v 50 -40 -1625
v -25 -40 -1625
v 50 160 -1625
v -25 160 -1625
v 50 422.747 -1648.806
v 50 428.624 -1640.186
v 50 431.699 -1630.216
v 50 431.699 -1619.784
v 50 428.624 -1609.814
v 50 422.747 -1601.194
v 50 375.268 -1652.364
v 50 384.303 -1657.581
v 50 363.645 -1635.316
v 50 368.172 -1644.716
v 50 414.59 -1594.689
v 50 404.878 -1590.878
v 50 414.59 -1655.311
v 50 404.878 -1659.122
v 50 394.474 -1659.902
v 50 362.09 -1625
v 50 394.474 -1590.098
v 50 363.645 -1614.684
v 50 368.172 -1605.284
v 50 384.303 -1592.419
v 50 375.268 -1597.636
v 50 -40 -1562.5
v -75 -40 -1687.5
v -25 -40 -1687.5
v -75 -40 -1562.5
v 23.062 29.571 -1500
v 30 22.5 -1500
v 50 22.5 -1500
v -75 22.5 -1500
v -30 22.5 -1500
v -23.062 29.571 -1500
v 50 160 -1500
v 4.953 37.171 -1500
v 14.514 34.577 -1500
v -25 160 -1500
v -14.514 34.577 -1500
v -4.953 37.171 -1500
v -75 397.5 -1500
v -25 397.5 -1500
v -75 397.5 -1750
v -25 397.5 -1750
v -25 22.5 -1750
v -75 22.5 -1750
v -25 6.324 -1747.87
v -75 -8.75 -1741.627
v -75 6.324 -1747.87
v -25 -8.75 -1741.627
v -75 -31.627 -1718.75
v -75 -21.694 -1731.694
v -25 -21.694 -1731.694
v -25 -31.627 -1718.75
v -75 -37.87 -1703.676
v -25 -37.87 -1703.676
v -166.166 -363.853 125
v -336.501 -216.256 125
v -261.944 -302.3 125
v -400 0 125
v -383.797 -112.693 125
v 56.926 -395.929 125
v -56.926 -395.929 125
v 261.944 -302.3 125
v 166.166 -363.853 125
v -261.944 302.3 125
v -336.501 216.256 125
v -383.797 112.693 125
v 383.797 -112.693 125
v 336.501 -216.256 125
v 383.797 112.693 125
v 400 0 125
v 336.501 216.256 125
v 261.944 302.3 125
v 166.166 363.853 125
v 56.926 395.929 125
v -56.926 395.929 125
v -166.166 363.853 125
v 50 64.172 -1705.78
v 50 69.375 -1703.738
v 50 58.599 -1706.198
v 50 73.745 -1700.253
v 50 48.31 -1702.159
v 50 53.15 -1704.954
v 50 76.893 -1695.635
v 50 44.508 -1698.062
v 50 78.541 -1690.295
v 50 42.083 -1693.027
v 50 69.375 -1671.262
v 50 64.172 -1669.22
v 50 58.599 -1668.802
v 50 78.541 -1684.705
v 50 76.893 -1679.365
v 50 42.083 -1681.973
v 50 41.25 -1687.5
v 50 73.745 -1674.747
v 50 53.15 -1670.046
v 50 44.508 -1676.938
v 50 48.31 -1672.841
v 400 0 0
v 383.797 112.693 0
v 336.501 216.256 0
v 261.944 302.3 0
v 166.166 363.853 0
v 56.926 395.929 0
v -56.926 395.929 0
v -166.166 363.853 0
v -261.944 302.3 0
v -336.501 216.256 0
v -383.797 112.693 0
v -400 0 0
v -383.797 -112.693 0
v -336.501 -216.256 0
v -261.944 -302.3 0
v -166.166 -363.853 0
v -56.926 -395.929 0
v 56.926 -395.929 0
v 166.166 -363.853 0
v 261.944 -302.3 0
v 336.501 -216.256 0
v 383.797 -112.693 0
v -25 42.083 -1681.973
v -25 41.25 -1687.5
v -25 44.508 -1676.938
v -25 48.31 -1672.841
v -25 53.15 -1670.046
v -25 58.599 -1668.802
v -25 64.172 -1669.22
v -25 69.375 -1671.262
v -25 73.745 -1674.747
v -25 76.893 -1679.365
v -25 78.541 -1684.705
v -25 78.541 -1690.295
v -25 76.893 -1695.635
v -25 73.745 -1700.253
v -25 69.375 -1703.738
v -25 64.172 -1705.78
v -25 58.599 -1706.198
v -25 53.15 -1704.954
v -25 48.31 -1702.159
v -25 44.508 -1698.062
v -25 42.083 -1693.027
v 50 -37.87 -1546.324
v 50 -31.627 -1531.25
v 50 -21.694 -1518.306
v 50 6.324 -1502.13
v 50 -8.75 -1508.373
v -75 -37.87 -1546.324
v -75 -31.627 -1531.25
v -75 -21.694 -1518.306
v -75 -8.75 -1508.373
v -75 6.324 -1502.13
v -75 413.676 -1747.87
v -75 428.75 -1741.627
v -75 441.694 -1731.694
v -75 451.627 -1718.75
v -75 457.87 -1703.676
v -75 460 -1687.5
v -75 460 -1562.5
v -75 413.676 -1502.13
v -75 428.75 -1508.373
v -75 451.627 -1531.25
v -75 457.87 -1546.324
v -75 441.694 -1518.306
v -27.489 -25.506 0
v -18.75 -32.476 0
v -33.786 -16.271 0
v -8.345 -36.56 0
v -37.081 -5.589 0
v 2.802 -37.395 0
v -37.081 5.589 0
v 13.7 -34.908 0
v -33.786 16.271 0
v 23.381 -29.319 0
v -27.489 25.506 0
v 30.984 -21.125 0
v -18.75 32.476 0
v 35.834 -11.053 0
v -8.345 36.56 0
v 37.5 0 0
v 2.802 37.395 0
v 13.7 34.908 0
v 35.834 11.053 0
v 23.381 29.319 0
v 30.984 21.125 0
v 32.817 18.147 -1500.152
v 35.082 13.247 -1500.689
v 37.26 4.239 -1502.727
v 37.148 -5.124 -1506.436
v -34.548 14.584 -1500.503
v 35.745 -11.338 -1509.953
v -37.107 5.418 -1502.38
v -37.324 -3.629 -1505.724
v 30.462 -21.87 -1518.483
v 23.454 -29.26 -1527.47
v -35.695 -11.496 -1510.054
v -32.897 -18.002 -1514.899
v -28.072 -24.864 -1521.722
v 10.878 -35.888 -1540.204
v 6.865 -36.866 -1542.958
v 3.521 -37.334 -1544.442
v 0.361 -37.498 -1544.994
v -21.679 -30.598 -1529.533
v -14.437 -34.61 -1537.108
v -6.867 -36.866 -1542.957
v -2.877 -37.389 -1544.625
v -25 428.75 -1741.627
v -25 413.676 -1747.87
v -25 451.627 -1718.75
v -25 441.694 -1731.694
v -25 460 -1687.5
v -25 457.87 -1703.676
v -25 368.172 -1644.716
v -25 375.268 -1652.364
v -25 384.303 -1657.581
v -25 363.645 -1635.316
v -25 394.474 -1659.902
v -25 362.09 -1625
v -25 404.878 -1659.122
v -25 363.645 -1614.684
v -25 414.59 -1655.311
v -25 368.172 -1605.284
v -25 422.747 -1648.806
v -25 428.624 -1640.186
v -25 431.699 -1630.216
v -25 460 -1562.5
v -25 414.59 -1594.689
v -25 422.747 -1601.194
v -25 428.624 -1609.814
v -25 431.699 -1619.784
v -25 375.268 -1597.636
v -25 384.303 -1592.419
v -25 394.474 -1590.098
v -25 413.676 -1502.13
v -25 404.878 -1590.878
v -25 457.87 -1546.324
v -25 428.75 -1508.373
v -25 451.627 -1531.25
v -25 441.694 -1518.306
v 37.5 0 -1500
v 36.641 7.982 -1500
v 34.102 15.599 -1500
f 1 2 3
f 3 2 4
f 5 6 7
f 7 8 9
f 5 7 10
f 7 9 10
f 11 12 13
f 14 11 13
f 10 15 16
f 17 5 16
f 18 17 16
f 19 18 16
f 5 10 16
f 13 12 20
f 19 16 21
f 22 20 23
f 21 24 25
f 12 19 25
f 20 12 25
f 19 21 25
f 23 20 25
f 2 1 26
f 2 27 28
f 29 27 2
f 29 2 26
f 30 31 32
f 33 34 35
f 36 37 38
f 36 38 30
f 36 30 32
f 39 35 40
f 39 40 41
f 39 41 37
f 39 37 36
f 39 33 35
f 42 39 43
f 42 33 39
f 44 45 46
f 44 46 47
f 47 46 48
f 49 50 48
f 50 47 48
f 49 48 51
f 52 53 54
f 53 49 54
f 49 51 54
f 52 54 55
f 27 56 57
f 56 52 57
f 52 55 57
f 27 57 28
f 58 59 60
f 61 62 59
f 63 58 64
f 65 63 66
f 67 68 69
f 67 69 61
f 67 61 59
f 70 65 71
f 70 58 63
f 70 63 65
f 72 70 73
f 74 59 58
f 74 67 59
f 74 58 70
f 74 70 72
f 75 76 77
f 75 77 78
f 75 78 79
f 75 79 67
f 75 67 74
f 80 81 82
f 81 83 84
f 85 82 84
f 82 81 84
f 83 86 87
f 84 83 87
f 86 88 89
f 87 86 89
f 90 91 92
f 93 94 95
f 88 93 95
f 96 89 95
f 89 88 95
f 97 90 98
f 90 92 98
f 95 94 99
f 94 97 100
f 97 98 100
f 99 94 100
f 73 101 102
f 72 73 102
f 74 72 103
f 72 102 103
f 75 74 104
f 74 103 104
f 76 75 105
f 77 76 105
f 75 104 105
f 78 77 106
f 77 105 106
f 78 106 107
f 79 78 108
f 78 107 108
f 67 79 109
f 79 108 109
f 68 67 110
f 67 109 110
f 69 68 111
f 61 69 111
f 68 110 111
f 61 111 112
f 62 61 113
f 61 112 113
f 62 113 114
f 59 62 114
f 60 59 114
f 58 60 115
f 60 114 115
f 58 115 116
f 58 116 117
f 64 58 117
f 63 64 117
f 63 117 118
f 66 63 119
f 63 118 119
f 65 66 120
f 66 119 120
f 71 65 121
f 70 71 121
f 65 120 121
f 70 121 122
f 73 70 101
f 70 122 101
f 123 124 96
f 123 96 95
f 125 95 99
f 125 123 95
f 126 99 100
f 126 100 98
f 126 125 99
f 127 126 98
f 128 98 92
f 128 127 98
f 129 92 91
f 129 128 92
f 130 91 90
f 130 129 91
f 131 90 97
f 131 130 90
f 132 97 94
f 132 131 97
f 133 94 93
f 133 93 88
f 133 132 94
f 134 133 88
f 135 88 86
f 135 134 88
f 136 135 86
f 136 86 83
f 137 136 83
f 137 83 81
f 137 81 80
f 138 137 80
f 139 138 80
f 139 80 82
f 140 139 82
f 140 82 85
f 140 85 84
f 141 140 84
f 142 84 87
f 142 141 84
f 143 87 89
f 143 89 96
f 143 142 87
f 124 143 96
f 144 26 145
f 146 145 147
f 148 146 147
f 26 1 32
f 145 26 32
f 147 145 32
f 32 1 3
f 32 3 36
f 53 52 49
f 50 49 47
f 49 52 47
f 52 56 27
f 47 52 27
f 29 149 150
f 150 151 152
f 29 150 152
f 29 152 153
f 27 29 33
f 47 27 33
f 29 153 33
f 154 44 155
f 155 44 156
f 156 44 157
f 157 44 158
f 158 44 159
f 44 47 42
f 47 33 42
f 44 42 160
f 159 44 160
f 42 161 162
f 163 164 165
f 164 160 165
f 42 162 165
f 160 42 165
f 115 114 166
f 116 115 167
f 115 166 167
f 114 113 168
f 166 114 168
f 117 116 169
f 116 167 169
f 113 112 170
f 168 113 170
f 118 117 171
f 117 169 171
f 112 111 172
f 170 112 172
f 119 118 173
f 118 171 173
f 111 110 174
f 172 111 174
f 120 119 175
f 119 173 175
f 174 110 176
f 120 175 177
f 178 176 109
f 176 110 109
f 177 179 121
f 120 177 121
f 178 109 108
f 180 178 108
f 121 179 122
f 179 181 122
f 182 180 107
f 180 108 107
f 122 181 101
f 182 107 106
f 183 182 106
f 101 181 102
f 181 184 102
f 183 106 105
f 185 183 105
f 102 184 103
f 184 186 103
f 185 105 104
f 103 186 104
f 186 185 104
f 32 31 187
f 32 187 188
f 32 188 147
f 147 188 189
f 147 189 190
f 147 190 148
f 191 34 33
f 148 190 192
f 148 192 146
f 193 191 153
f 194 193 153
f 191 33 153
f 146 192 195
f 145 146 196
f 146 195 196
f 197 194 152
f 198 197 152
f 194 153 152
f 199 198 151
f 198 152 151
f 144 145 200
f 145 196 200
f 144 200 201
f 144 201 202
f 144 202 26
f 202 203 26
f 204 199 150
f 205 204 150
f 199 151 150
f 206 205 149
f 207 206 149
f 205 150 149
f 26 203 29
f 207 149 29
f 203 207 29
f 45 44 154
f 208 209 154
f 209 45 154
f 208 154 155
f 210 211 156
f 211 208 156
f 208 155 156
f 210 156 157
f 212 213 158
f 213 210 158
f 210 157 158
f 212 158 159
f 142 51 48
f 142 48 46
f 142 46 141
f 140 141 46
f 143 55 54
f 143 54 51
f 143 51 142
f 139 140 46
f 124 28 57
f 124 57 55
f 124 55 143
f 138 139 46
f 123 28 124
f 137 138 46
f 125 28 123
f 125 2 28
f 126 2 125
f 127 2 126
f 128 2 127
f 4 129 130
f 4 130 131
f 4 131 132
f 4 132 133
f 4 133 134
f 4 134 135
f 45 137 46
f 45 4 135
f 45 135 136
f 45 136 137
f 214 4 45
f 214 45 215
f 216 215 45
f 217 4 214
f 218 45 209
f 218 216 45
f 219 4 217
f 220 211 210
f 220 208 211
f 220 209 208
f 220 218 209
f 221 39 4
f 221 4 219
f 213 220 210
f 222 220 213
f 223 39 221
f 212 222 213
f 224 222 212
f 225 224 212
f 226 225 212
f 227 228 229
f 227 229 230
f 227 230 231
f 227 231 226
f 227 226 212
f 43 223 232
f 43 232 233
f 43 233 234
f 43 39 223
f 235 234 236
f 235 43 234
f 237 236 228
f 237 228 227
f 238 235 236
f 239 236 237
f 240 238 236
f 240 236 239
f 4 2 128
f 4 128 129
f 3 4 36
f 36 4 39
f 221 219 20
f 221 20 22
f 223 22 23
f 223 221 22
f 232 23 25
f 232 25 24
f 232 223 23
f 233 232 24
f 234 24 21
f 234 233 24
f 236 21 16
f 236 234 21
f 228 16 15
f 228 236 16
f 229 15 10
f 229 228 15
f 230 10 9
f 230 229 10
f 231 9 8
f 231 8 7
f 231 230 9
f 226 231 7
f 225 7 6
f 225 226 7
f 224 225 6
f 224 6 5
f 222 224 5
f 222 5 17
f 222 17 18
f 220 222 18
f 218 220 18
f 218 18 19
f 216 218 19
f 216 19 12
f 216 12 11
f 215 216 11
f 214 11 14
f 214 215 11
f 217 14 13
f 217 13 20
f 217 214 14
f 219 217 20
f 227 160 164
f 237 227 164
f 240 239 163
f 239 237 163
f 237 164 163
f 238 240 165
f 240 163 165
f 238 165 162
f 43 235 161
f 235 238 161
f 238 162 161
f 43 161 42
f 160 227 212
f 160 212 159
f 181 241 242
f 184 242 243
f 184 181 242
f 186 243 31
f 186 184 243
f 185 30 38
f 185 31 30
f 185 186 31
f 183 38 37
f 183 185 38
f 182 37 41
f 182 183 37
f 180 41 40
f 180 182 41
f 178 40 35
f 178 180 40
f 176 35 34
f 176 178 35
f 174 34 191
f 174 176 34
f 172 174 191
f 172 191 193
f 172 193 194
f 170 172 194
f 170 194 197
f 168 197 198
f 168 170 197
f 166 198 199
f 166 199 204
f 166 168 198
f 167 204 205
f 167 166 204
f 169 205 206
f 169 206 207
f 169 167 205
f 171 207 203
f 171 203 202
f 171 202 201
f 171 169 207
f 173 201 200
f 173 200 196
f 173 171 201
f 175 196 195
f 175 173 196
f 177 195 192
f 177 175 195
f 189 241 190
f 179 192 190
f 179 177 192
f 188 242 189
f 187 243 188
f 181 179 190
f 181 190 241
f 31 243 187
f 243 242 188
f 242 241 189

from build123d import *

# Parameters (mm, degrees)
SKETCH1_R           = 400
BOSS_EXTRUDE1_DEPTH = 125
SKETCH2_R           = 37.5
BOSS_EXTRUDE2_DEPTH = 1500
SKETCH3_W           = 50
SKETCH3_H           = 500
BOSS_EXTRUDE3_DEPTH = 250
SKETCH4_R           = 18.75
SKETCH4_R_2         = 35
SKETCH4_W           = 125
SKETCH4_H           = 200
BOSS_EXTRUDE4_DEPTH = 75
FILLET1_R           = 62.5


with BuildPart() as part:
    # Sketch1 → Boss-Extrude1 (new body)
    with BuildSketch(Plane.XY):
        Circle(SKETCH1_R)
    extrude(amount=BOSS_EXTRUDE1_DEPTH)

    # Sketch2 → Boss-Extrude2 (add)
    with BuildSketch(Plane(origin=(0, 0, 0), x_dir=(-1, 0, 0), z_dir=(0, 0, -1))):
        with Locations(Location((0, 0, 0), (0, 0, 180))):
            Circle(SKETCH2_R)
    extrude(amount=BOSS_EXTRUDE2_DEPTH)

    # Sketch3 → Boss-Extrude3 (add)
    with BuildSketch(Plane(origin=(0, 0, -1500), x_dir=(-1, 0, 0), z_dir=(0, 0, -1))):
        with Locations((50, 210)):
            Rectangle(SKETCH3_W, SKETCH3_H)
    extrude(amount=BOSS_EXTRUDE3_DEPTH)

    # Sketch4 → Boss-Extrude4 (add)
    with BuildSketch(Plane.ZY.offset(25)):
        with Locations(Location((-1687.5, 60, 0), (0, 0, 270))):
            Circle(SKETCH4_R)
        with Locations(Location((-1625, 397.09, 0), (0, 0, 270))):
            Circle(SKETCH4_R_2)
        with Locations((-1562.5, 60)):
            Rectangle(SKETCH4_W, SKETCH4_H)
    extrude(amount=-BOSS_EXTRUDE4_DEPTH)

    # Fillet1
    # the kernel refuses this fillet: 62.5 mm, written as the material it takes off along each edge
    with BuildSketch(Plane(origin=(-231.25, 460, -1500), x_dir=(0, -1, 0), z_dir=(1, 0, 0))) as fillet1_piece_1:
        with BuildLine():
            CenterArc((FILLET1_R, FILLET1_R), FILLET1_R, 180, 90)
            Line((0, FILLET1_R), (0, 0))
            Line((0, 0), (FILLET1_R, 0))
        make_face()
    extrude(amount=362.5, mode=Mode.SUBTRACT)
    with BuildSketch(Plane(origin=(-231.25, -40, -1500), x_dir=(0, 1, 0), z_dir=(1, 0, 0))) as fillet1_piece_2_section:
        with BuildLine():
            CenterArc((FILLET1_R, -FILLET1_R), FILLET1_R, 90, 90)
            Line((0, -FILLET1_R), (0, 0))
            Line((0, 0), (FILLET1_R, 0))
        make_face()
    fillet1_piece_2 = extrude(amount=437.5, mode=Mode.PRIVATE)
    fillet1_piece_2 = fillet1_piece_2 - Plane(origin=(0, 0, -1501.420624631), x_dir=(1, 0, 0), z_dir=(0, 0, 1)) * Cylinder(37.5, 1125, mode=Mode.PRIVATE)
    add(fillet1_piece_2, mode=Mode.SUBTRACT)
    with BuildSketch(Plane(origin=(-231.25, 460, -1750), x_dir=(0, -1, 0), z_dir=(1, 0, 0)), Plane(origin=(131.25, -40, -1750), x_dir=(0, 1, 0), z_dir=(-1, 0, 0))) as fillet1_piece_3:
        with BuildLine():
            CenterArc((FILLET1_R, -FILLET1_R), FILLET1_R, 90, 90)
            Line((0, -FILLET1_R), (0, 0))
            Line((0, 0), (FILLET1_R, 0))
        make_face()
    extrude(amount=362.5, mode=Mode.SUBTRACT)


solid = part.part
